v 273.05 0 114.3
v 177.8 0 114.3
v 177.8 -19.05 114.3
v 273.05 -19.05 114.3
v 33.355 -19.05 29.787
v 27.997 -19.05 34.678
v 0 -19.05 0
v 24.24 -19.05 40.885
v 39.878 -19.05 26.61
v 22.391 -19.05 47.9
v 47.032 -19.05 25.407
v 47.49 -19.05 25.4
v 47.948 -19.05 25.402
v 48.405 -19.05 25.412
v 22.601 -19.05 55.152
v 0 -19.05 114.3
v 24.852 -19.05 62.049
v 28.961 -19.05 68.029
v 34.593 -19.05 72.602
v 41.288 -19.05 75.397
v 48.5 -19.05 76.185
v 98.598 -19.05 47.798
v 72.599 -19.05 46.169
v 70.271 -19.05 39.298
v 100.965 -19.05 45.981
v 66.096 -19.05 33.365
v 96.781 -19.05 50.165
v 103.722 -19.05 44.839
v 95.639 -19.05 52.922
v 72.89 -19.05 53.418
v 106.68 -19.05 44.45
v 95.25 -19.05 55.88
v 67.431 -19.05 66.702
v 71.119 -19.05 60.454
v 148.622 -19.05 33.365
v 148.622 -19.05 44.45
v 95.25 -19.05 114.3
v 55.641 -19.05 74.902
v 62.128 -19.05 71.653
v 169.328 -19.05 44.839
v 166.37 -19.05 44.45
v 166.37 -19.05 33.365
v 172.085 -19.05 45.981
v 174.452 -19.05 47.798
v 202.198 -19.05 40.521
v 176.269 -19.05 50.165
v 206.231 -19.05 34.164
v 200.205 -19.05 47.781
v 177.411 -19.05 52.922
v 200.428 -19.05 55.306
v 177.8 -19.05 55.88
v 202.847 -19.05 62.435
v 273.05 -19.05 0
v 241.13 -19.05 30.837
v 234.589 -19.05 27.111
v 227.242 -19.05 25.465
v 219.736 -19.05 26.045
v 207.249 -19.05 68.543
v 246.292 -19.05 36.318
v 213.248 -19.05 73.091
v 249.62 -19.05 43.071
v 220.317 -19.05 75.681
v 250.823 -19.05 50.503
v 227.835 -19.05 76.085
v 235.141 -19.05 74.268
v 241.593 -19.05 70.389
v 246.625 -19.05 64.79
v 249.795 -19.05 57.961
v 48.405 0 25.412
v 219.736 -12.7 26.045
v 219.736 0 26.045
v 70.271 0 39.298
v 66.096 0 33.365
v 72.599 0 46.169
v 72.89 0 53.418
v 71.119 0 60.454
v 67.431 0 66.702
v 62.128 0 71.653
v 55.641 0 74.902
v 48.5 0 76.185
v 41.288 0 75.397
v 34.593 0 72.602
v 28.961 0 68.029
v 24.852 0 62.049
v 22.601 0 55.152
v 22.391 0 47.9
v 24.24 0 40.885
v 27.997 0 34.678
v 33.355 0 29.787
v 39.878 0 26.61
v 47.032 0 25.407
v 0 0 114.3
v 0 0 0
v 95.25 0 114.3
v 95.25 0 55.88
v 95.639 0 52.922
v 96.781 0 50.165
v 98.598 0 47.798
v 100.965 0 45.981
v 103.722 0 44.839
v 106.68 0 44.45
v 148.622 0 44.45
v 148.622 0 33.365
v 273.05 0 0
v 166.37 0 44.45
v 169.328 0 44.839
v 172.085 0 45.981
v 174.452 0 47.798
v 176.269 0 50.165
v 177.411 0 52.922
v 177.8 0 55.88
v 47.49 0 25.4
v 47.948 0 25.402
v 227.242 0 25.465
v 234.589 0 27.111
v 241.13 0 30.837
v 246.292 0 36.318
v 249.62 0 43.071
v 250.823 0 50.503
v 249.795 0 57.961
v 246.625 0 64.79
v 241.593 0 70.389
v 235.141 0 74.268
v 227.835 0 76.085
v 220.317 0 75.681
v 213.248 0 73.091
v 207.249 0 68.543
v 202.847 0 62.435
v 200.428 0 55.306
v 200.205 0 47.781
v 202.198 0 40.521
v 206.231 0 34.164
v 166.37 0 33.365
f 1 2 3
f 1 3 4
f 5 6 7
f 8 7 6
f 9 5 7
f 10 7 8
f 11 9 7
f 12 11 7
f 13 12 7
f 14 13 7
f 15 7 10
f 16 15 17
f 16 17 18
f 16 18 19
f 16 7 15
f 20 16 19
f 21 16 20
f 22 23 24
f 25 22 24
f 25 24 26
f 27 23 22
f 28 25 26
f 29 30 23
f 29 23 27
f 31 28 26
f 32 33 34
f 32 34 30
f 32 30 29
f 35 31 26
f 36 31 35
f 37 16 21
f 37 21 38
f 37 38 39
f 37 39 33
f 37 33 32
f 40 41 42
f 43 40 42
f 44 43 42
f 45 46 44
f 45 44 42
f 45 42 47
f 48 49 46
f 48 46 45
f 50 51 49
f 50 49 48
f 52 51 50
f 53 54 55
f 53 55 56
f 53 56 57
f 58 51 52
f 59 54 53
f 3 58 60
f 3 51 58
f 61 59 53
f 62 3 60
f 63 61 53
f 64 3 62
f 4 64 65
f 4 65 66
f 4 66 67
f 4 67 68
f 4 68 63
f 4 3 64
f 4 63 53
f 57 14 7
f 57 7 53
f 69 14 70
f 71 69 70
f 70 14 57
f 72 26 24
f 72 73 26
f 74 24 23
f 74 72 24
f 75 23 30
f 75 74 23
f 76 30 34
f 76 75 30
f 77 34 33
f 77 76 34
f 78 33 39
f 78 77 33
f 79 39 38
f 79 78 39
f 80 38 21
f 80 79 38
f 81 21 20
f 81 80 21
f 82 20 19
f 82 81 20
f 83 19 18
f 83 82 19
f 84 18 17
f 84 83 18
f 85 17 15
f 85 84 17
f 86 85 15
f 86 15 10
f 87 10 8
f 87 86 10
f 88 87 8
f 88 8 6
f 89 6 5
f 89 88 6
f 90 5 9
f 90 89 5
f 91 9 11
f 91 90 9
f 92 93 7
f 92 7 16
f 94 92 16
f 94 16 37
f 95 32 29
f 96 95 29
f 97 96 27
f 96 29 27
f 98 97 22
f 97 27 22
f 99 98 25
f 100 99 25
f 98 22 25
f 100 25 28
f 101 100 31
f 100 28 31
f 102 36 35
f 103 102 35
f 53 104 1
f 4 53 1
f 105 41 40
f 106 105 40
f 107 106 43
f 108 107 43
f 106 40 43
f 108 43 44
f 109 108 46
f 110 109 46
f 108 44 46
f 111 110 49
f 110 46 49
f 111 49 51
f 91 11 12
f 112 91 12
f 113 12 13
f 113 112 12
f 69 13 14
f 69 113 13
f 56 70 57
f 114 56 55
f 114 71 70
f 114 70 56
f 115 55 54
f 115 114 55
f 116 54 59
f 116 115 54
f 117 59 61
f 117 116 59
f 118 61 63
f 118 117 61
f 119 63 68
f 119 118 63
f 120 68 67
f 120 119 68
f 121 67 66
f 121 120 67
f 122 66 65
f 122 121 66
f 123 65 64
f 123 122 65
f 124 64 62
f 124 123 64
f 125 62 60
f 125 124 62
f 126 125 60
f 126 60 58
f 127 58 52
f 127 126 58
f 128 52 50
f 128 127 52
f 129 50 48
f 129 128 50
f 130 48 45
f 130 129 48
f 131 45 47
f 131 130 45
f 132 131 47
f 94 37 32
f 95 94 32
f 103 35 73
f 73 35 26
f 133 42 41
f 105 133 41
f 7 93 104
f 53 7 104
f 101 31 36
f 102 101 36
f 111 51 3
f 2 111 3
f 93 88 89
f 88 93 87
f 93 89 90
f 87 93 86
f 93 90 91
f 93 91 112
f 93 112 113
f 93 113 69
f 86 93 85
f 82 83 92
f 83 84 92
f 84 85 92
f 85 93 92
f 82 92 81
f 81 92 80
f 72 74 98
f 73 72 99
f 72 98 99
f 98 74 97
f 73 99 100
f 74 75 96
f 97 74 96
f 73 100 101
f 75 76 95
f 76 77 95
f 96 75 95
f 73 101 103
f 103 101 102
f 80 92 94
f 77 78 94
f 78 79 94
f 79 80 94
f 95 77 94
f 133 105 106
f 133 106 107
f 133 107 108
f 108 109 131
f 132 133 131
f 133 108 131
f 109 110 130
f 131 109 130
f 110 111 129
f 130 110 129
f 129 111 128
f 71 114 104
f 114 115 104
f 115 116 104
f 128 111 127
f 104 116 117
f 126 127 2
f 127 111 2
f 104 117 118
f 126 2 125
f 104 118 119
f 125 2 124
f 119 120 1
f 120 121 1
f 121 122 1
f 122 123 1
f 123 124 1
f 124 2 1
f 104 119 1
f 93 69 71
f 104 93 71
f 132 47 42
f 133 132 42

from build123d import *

# Parameters (mm, degrees)
F0_W     = 273.05
F0_H     = 114.3
F0_R     = 25.4
F1_DEPTH = 19.05
F3_DEPTH = 25.4
F5_DEPTH = 25.4


with BuildPart() as f1:
    # F0 (on Front) → F1 (new body)
    with BuildSketch(Plane.XZ):
        with Locations((136.525, 57.15)):
            Rectangle(F0_W, F0_H)
        with Locations((47.625, 50.8)):
            Circle(F0_R, mode=Mode.SUBTRACT)
        with Locations((225.425, 50.8)):
            Circle(F0_R, mode=Mode.SUBTRACT)
    extrude(amount=F1_DEPTH)

    # F2 (on face) → F3 (cut)
    with BuildSketch(Plane.XZ.offset(19.05)):
        with BuildLine():
            Line((177.8, 114.3), (95.25, 114.3))
            Line((95.25, 114.3), (95.25, 55.88))
            ThreePointArc((95.25, 55.88), (98.597769, 47.797769), (106.68, 44.45))
            Line((106.68, 44.45), (166.37, 44.45))
            ThreePointArc((166.37, 44.45), (174.452231, 47.797769), (177.8, 55.88))
            Line((177.8, 55.88), (177.8, 114.3))
        make_face()
    extrude(amount=-F3_DEPTH, mode=Mode.SUBTRACT)

    # F4 (on face) → F5 (cut)
    with BuildSketch(Plane.XZ.offset(19.05)):
        Polygon((166.37, 33.364765), (166.37, 44.45), (148.622125, 44.45), (148.622125, 33.364765), (66.095858, 33.364765), (47.032329, 25.406915), (219.736259, 26.045238), (206.231396, 34.163728), align=None)
    extrude(amount=-F5_DEPTH, mode=Mode.SUBTRACT)


solid = f1.part
